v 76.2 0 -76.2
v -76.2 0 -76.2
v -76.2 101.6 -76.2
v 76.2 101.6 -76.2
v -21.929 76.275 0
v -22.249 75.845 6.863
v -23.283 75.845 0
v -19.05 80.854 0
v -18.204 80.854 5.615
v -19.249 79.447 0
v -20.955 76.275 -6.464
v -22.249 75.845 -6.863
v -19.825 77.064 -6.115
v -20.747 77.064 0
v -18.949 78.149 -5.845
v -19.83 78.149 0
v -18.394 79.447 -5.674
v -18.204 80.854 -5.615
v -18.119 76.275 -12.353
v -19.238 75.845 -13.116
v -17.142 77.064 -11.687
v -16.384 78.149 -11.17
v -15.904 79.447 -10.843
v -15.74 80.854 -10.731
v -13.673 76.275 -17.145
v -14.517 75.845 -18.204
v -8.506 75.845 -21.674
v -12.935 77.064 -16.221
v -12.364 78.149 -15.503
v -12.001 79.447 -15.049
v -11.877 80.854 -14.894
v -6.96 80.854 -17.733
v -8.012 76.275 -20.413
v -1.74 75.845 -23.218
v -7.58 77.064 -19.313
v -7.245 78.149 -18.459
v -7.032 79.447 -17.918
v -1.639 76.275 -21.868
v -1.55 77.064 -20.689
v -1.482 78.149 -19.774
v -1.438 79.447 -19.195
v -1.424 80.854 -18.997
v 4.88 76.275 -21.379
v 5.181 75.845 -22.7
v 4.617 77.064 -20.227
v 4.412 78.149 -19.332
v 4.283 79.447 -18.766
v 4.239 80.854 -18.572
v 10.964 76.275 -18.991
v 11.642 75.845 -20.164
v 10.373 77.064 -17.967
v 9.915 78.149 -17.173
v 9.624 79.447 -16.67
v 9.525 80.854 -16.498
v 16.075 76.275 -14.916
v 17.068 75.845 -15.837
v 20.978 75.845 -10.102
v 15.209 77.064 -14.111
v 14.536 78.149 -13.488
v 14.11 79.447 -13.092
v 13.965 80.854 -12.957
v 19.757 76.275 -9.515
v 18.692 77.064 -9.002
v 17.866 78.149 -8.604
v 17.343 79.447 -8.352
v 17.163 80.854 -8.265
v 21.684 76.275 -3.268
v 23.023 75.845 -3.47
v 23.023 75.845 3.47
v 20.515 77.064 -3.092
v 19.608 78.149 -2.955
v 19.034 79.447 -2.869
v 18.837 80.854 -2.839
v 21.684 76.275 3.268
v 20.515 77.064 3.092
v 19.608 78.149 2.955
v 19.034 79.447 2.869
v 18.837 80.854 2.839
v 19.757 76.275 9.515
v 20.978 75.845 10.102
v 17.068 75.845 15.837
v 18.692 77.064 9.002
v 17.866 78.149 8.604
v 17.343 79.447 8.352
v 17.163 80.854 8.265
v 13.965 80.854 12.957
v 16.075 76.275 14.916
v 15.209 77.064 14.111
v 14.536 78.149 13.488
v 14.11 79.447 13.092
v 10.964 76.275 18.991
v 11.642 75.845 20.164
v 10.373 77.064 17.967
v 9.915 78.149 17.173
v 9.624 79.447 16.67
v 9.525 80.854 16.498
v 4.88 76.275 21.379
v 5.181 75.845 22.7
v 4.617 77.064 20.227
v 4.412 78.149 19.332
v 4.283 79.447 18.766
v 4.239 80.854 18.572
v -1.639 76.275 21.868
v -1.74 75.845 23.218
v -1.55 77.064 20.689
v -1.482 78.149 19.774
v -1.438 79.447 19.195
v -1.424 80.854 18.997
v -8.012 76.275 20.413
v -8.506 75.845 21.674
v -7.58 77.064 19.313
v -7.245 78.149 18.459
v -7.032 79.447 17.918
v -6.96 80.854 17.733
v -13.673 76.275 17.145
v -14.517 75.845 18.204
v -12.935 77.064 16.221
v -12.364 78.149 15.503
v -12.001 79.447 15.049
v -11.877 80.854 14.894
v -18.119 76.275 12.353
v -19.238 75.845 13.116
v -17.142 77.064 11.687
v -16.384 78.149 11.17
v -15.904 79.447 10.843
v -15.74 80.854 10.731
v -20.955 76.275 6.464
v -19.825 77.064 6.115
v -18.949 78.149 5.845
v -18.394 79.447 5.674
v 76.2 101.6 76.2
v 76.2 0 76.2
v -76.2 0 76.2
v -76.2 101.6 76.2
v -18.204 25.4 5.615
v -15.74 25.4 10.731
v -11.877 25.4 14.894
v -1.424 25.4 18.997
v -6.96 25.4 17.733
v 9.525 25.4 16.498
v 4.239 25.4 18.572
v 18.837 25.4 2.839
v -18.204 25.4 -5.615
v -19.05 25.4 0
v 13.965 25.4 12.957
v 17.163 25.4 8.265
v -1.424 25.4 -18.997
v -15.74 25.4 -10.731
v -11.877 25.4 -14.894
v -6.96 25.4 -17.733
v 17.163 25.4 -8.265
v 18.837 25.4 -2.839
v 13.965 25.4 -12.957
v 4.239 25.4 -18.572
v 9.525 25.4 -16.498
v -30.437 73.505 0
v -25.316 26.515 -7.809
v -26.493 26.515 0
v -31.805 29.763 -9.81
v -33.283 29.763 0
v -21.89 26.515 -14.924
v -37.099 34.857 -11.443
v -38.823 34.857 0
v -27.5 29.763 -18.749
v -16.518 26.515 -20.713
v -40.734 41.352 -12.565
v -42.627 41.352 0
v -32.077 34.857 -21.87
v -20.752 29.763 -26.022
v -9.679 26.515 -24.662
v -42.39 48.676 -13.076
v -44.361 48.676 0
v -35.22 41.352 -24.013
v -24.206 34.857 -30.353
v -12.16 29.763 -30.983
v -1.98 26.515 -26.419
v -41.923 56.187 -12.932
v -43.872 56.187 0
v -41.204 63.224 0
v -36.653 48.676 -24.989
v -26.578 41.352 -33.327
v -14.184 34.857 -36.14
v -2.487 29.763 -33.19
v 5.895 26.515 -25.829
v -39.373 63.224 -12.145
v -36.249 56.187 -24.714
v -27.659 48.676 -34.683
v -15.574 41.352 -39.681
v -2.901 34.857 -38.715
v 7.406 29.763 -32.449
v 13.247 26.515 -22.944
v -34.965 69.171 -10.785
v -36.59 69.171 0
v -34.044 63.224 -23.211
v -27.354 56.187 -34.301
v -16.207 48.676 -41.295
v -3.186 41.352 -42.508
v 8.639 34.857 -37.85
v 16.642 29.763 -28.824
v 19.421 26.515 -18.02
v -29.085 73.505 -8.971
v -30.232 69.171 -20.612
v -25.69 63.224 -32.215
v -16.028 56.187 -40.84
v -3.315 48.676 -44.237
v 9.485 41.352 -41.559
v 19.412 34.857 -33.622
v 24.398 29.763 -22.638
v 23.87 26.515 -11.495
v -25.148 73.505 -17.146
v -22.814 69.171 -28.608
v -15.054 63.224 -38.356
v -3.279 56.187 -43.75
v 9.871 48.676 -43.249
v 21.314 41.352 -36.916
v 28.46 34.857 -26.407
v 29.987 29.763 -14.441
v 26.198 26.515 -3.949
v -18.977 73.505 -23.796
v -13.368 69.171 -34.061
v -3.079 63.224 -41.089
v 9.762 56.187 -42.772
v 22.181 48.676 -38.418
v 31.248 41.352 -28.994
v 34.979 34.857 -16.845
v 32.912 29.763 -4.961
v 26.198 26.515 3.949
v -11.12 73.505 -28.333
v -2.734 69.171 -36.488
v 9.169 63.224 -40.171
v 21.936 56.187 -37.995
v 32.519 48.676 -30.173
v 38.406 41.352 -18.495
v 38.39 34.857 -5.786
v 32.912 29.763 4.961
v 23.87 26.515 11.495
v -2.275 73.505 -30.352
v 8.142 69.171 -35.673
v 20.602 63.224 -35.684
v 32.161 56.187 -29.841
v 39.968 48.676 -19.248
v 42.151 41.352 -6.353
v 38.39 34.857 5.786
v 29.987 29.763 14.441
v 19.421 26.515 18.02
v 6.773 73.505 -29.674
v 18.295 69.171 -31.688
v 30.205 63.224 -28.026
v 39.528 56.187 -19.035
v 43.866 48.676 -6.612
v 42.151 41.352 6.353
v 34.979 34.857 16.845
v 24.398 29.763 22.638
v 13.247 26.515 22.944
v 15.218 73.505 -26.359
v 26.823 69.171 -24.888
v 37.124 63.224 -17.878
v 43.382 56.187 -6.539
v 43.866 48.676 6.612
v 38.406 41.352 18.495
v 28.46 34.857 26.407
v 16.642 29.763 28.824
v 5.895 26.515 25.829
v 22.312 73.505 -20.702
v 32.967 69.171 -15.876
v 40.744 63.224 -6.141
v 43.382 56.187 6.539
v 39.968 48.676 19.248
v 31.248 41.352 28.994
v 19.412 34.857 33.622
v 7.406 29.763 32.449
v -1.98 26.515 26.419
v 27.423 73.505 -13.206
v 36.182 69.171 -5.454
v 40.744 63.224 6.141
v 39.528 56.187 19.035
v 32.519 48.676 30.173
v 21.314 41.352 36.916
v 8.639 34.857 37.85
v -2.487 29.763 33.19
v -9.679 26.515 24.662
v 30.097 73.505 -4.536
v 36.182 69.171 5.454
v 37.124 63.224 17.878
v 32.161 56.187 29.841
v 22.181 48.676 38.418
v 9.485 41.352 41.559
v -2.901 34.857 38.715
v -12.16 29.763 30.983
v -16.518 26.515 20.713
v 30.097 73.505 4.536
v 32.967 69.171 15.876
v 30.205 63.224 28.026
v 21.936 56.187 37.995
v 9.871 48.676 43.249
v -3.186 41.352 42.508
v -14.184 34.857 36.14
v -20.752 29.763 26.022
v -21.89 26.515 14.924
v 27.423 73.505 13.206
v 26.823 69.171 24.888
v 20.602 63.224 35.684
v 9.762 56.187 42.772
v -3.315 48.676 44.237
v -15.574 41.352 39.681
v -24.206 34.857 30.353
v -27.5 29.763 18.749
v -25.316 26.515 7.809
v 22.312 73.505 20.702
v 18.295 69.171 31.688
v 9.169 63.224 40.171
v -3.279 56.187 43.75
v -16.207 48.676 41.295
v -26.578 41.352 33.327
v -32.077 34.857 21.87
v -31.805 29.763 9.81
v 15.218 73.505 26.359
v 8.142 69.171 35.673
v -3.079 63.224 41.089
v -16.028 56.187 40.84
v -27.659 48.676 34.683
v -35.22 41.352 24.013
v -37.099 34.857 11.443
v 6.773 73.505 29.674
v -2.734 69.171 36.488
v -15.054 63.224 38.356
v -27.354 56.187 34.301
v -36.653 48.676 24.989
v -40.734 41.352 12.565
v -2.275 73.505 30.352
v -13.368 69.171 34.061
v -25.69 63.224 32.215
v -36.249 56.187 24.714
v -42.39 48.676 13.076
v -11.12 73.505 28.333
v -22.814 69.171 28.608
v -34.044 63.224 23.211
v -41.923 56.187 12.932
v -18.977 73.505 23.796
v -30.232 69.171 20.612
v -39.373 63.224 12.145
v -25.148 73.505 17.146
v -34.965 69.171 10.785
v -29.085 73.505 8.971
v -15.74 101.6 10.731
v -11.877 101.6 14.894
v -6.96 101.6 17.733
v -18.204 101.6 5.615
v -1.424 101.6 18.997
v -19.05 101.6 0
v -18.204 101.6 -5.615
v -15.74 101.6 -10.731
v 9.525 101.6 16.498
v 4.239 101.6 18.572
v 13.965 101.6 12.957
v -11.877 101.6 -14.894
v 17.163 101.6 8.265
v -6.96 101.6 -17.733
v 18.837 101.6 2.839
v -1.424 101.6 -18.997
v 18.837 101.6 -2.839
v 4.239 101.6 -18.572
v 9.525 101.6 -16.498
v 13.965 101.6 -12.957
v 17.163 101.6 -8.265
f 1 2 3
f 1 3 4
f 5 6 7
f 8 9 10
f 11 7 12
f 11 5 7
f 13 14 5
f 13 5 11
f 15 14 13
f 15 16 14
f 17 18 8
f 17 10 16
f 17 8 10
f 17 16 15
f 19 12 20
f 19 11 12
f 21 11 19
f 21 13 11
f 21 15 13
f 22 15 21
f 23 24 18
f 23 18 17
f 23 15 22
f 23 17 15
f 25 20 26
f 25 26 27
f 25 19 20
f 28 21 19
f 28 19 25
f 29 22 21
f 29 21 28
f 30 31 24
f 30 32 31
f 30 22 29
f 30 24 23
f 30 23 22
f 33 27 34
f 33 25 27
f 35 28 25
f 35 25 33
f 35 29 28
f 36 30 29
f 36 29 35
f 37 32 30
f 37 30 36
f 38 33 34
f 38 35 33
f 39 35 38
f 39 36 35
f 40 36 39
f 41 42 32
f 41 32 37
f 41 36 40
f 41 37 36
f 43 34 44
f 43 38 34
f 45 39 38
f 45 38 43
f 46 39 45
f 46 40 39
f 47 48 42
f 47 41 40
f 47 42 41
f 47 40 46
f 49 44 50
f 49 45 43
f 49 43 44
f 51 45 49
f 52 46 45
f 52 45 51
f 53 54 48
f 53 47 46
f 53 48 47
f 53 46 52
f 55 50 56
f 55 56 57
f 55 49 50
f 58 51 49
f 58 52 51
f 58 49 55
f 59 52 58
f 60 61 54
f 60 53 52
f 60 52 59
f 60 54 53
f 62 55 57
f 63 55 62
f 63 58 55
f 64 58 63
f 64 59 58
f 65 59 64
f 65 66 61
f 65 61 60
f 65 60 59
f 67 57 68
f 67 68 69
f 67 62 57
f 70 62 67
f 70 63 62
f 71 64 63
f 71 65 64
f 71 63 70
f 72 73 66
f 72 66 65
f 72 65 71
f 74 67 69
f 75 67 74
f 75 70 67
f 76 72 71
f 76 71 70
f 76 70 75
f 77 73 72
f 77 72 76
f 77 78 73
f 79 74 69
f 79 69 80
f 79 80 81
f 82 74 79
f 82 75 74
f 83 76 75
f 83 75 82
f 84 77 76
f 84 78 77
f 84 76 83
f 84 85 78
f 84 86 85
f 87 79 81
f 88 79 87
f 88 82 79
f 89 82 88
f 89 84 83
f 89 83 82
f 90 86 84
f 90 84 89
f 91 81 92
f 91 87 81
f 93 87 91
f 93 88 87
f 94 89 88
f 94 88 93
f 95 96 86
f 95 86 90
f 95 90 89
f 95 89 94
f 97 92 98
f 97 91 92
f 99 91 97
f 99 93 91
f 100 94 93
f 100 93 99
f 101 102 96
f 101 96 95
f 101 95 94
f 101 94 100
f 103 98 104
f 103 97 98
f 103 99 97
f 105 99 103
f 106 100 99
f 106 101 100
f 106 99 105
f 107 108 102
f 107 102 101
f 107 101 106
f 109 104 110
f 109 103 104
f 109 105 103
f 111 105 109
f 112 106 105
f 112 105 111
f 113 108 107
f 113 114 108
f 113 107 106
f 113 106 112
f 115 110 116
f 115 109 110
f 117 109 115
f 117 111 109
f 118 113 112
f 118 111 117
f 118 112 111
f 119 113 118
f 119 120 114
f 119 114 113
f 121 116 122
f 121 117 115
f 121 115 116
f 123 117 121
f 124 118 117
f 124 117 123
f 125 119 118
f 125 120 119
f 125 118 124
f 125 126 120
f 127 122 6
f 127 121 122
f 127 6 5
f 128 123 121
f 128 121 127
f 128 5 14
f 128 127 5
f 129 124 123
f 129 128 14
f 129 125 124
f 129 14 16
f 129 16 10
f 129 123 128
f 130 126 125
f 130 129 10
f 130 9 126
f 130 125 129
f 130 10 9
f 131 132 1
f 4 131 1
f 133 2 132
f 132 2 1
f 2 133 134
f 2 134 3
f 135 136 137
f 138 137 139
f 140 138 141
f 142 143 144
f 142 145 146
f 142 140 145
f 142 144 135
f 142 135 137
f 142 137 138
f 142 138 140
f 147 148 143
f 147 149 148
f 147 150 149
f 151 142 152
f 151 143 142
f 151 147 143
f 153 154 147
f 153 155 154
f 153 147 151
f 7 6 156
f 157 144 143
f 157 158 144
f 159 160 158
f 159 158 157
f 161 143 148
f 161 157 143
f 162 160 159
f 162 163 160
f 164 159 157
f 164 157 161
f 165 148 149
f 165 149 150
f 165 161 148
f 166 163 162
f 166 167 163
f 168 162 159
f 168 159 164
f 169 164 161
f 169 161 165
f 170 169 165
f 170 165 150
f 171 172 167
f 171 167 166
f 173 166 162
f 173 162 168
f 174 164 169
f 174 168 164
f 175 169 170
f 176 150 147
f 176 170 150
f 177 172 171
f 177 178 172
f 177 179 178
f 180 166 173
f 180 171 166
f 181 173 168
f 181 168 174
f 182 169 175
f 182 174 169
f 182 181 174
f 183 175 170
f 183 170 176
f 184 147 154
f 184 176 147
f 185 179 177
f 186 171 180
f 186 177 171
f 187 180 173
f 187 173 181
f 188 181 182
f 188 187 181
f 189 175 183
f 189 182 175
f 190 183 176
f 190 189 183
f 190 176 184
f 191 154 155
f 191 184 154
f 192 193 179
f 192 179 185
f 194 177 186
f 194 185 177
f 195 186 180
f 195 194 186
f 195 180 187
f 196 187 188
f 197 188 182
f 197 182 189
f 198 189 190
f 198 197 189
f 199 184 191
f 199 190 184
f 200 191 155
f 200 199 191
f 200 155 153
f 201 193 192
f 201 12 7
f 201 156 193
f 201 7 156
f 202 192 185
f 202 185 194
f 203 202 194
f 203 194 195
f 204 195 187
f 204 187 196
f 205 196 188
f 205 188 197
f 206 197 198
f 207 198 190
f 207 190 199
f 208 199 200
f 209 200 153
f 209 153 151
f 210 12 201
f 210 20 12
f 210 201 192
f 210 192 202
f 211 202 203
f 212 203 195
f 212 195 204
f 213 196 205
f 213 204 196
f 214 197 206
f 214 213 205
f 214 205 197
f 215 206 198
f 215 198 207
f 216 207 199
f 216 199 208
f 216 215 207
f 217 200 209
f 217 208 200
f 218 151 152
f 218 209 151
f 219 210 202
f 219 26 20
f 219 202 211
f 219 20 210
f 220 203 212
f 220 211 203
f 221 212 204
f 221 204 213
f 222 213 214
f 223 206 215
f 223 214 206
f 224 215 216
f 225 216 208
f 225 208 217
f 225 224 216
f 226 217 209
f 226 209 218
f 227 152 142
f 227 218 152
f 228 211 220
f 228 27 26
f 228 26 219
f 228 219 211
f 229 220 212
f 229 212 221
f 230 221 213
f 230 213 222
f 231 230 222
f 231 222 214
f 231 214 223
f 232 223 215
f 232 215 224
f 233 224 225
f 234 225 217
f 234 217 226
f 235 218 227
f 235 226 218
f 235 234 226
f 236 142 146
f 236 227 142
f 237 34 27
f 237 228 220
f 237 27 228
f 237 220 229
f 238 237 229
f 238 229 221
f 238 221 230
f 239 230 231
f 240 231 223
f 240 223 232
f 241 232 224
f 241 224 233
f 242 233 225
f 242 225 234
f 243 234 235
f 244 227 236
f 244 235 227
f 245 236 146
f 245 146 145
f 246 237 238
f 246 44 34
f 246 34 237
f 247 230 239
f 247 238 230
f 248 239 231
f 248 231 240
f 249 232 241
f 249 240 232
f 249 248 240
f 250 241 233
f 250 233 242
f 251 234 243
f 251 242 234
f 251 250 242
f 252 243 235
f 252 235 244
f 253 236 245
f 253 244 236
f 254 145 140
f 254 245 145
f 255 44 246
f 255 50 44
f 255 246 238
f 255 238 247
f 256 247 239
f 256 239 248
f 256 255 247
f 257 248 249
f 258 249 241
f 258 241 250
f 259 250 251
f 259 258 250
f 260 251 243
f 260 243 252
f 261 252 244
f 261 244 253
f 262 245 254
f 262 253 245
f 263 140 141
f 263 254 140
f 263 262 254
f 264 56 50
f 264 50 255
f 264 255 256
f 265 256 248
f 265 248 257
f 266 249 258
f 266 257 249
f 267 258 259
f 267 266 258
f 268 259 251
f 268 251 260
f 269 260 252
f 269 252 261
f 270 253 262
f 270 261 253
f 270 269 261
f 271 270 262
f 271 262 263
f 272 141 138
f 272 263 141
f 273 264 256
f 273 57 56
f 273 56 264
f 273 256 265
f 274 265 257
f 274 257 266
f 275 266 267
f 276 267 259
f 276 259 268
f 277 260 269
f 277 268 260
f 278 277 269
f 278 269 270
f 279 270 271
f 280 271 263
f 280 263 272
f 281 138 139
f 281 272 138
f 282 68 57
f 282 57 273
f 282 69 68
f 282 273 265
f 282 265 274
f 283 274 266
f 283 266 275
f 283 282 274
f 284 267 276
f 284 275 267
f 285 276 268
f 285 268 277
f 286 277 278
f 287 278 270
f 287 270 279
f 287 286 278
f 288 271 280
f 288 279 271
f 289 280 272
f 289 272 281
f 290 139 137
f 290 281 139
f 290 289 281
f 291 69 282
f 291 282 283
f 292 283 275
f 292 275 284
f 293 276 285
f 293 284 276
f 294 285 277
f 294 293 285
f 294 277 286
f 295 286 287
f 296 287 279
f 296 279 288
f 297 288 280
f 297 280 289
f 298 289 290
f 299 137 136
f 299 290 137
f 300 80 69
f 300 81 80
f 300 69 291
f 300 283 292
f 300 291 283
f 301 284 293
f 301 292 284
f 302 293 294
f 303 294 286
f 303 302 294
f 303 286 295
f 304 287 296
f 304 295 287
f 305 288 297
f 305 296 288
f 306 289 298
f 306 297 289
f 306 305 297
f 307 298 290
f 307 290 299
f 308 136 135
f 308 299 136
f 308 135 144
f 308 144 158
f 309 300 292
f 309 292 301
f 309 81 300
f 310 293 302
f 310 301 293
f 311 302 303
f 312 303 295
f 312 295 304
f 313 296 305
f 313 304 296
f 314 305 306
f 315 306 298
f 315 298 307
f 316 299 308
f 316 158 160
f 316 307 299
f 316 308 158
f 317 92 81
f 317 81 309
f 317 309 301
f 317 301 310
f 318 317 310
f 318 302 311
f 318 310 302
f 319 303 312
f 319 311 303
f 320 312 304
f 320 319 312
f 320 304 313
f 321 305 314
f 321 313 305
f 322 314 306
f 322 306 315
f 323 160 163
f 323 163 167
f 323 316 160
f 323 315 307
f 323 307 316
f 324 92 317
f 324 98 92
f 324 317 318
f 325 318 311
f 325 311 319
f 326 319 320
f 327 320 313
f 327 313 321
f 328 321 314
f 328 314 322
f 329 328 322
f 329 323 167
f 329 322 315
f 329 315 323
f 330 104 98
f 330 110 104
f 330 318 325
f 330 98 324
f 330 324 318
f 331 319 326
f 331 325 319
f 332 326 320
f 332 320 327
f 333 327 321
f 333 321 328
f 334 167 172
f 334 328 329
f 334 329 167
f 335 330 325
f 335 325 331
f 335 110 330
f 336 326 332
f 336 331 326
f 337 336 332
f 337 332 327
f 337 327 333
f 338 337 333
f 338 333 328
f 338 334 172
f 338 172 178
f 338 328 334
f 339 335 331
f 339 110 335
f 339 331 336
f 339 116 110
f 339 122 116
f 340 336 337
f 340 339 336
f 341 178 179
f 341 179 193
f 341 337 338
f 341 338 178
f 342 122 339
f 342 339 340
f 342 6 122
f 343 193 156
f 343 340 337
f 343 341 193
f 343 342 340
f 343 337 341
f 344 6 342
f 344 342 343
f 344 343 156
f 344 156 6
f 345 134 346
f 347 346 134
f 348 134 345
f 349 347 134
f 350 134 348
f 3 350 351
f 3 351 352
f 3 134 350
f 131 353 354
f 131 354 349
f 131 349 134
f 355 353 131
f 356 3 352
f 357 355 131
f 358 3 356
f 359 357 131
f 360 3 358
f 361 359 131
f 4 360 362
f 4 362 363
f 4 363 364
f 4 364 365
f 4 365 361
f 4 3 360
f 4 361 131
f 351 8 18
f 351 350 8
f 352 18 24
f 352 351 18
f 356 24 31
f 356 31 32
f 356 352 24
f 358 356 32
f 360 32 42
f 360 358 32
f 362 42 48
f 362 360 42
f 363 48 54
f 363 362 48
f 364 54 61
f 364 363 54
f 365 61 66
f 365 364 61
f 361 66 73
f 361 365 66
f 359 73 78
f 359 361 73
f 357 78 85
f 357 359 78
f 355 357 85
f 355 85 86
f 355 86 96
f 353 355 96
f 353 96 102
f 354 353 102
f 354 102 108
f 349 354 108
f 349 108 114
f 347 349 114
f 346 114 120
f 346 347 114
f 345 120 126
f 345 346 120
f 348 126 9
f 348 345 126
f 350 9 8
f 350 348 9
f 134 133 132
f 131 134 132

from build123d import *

# Parameters (mm, degrees)
SKETCH1_W           = 152.4
SKETCH1_H           = 152.4
BOSS_EXTRUDE1_DEPTH = 101.6


with BuildPart() as part:
    # Sketch1 → Boss-Extrude1 (new body)
    with BuildSketch(Plane(origin=(0, 0, 0), x_dir=(1, 0, 0), z_dir=(0, 1, 0))):
        Rectangle(SKETCH1_W, SKETCH1_H)
    extrude(amount=BOSS_EXTRUDE1_DEPTH)

    # Sketch3 → Cut-Revolve4 (revolve, cut)
    with BuildSketch(Plane.XY):
        with BuildLine():
            Line((-19.05, 80.853685298), (-19.05, 101.6))
            Line((-19.05, 101.6), (0, 101.6))
            Line((0, 101.6), (0, 25.4))
            Line((0, 25.4), (-19.05, 25.4))
            ThreePointArc((-19.05, 25.4), (-44.361028612, 48.675892989), (-23.283333333, 75.844737748))
            ThreePointArc((-23.283333333, 75.844737748), (-20.250085912, 77.574559398), (-19.05, 80.853685298))
        make_face()
    revolve(axis=Axis((0, 101.6, 0), (0, -1, 0)), mode=Mode.SUBTRACT)


solid = part.part
